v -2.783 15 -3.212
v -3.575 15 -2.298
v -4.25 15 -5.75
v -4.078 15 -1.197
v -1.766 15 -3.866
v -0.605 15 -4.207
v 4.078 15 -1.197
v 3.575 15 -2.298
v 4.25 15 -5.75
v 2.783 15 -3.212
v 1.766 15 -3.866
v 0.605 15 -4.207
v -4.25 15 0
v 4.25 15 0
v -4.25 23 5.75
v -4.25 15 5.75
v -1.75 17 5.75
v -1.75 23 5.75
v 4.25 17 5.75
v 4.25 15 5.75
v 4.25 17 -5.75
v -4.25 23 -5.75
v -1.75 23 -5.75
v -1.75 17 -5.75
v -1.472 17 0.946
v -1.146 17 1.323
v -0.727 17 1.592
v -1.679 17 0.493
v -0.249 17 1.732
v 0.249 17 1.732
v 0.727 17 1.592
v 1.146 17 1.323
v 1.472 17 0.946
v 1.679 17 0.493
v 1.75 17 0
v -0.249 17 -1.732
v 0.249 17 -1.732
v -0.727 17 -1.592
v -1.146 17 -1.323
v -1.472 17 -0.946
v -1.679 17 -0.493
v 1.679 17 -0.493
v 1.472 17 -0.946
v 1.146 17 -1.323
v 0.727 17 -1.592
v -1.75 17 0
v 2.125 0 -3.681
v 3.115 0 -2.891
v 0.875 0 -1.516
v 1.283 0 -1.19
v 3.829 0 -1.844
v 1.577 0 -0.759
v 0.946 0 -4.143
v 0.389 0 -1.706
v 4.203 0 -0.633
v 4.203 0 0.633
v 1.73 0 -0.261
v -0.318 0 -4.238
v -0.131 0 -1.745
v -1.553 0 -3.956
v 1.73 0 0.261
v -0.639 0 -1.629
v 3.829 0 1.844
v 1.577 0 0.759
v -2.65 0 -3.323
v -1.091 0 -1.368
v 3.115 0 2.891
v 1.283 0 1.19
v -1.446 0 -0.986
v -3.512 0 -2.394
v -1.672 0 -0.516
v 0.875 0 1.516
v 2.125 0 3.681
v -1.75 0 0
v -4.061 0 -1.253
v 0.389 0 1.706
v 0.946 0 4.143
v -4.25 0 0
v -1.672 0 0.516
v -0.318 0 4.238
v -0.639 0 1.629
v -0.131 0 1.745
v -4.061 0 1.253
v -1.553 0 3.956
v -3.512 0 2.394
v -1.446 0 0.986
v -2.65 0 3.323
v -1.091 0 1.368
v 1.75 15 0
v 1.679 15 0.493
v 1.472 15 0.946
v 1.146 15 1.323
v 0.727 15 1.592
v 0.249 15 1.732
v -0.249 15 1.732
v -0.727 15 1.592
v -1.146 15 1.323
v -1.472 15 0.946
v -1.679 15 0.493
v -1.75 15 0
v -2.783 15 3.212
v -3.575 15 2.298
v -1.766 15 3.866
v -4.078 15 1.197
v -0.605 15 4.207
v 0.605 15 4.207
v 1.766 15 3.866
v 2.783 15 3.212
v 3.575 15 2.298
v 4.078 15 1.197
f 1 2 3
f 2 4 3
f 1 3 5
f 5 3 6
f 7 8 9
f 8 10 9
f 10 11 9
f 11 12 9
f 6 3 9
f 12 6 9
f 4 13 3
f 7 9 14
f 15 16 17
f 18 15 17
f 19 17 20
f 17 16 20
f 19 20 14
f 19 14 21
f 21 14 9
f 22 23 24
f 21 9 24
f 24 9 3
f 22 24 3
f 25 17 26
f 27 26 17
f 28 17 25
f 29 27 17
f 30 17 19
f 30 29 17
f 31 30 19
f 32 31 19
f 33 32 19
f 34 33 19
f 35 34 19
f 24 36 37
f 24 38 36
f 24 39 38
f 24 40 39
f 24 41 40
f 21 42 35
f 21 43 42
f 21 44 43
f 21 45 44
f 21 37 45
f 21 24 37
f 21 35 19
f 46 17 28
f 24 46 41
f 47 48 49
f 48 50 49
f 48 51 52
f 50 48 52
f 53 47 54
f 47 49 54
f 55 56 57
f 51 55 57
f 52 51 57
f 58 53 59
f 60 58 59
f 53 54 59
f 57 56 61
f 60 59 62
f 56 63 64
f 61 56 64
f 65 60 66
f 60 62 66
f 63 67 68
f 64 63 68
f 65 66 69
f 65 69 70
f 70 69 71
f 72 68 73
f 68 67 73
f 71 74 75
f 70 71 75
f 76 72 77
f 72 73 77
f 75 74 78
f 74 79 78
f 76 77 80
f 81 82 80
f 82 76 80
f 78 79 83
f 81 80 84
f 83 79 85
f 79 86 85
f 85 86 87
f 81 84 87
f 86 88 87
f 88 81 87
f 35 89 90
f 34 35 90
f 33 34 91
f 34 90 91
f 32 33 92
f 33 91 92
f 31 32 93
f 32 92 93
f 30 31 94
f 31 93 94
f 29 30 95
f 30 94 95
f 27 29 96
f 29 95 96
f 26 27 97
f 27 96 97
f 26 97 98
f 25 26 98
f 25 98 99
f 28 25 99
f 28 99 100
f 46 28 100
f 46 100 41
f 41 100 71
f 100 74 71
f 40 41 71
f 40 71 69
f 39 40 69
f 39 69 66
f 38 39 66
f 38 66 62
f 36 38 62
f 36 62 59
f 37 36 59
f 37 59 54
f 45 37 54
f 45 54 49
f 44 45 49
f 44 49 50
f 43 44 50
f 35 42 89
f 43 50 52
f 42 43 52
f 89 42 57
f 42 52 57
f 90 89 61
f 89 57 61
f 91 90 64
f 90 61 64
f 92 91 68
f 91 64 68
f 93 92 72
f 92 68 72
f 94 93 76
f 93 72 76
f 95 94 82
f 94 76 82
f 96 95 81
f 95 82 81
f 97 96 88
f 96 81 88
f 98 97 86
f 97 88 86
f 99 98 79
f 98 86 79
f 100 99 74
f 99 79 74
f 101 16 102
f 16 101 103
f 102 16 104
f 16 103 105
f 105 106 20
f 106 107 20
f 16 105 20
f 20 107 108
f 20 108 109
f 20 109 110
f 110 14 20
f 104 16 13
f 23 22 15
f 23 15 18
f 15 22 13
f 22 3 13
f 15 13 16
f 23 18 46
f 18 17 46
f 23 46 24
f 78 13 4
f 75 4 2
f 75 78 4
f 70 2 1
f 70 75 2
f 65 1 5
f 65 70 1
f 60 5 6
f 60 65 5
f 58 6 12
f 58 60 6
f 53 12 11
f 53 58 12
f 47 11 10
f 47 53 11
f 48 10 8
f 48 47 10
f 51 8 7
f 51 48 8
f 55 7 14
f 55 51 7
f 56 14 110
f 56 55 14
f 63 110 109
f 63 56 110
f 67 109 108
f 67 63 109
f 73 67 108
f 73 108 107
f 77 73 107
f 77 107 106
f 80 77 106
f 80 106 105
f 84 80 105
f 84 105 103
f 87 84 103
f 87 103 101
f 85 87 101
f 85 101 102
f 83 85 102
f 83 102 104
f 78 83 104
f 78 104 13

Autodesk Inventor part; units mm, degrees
ref_plane "YZ Plane" through (0, 0, 0) normal (1, 0, 0) x (0, 1, 0)
ref_plane "XZ Plane" through (0, 0, 0) normal (0, 1, 0) x (-1, 0, 0)
ref_plane "XY Plane" through (0, 0, 0) normal (0, 0, 1) x (1, 0, 0)
sketch "Sketch1" plane through (0, 0, 0) normal (0, 1, 0) x (-1, 0, 0)
  circle A0 centre (0, 0) radius 4.25
  circle A1 centre (0, 0) radius 1.75
  dimension "d0" = 8.5
  dimension "d1" = 3.5
extrude "Extrusion1" add sketch "Sketch1" along normal blind 15
sketch "Sketch2" plane through (0, 15, 0) normal (0, 1, 0) x (1, 0, 0)
  line L0 (4.25, 3.75) -> (-4.25, 3.75) construction
  line L1 (-4.25, 3.75) -> (-4.25, -3.75) construction
  line L2 (-4.25, -3.75) -> (4.25, -3.75) construction
  line L3 (4.25, -3.75) -> (4.25, 3.75) construction
  line L4 (4.25, 3.75) -> (-4.25, -3.75) construction
  line L5 (-4.25, 3.75) -> (4.25, -3.75) construction
  line L6 (-4.25, -5.75) -> (4.25, -5.75)
  line L7 (4.25, -5.75) -> (4.25, 5.75)
  line L8 (4.25, 5.75) -> (-4.25, 5.75)
  line L9 (-4.25, 5.75) -> (-4.25, -5.75)
  circle A0 centre (0, 0) radius 1.75
  circle A1 centre (0, 0) radius 1.75 projected
  dimension "d4" = 8.5
  dimension "d5" = 7.5
  dimension "d6" = 11.5
  dimension "d7" = 5.75
extrude "Extrusion2" add sketch "Sketch2" along normal blind 2
sketch "Sketch3" plane through (0, 17, 0) normal (0, 1, 0) x (1, 0, 0)
  line L0 (-4.25, -5.75) -> (4.25, -5.75) projected
  line L1 (4.25, 5.75) -> (-4.25, 5.75) projected
  line L2 (-4.25, -5.75) -> (-1.75, -5.75)
  line L3 (-1.75, -5.75) -> (-1.75, 5.75)
  line L4 (-1.75, 5.75) -> (-4.25, 5.75)
  line L5 (-4.25, 5.75) -> (-4.25, -5.75)
  point P0 (0, 0)
  dimension "d10" = 2.5
extrude "Extrusion3" add sketch "Sketch3" along normal blind 6
properties part number "CajonInf"
